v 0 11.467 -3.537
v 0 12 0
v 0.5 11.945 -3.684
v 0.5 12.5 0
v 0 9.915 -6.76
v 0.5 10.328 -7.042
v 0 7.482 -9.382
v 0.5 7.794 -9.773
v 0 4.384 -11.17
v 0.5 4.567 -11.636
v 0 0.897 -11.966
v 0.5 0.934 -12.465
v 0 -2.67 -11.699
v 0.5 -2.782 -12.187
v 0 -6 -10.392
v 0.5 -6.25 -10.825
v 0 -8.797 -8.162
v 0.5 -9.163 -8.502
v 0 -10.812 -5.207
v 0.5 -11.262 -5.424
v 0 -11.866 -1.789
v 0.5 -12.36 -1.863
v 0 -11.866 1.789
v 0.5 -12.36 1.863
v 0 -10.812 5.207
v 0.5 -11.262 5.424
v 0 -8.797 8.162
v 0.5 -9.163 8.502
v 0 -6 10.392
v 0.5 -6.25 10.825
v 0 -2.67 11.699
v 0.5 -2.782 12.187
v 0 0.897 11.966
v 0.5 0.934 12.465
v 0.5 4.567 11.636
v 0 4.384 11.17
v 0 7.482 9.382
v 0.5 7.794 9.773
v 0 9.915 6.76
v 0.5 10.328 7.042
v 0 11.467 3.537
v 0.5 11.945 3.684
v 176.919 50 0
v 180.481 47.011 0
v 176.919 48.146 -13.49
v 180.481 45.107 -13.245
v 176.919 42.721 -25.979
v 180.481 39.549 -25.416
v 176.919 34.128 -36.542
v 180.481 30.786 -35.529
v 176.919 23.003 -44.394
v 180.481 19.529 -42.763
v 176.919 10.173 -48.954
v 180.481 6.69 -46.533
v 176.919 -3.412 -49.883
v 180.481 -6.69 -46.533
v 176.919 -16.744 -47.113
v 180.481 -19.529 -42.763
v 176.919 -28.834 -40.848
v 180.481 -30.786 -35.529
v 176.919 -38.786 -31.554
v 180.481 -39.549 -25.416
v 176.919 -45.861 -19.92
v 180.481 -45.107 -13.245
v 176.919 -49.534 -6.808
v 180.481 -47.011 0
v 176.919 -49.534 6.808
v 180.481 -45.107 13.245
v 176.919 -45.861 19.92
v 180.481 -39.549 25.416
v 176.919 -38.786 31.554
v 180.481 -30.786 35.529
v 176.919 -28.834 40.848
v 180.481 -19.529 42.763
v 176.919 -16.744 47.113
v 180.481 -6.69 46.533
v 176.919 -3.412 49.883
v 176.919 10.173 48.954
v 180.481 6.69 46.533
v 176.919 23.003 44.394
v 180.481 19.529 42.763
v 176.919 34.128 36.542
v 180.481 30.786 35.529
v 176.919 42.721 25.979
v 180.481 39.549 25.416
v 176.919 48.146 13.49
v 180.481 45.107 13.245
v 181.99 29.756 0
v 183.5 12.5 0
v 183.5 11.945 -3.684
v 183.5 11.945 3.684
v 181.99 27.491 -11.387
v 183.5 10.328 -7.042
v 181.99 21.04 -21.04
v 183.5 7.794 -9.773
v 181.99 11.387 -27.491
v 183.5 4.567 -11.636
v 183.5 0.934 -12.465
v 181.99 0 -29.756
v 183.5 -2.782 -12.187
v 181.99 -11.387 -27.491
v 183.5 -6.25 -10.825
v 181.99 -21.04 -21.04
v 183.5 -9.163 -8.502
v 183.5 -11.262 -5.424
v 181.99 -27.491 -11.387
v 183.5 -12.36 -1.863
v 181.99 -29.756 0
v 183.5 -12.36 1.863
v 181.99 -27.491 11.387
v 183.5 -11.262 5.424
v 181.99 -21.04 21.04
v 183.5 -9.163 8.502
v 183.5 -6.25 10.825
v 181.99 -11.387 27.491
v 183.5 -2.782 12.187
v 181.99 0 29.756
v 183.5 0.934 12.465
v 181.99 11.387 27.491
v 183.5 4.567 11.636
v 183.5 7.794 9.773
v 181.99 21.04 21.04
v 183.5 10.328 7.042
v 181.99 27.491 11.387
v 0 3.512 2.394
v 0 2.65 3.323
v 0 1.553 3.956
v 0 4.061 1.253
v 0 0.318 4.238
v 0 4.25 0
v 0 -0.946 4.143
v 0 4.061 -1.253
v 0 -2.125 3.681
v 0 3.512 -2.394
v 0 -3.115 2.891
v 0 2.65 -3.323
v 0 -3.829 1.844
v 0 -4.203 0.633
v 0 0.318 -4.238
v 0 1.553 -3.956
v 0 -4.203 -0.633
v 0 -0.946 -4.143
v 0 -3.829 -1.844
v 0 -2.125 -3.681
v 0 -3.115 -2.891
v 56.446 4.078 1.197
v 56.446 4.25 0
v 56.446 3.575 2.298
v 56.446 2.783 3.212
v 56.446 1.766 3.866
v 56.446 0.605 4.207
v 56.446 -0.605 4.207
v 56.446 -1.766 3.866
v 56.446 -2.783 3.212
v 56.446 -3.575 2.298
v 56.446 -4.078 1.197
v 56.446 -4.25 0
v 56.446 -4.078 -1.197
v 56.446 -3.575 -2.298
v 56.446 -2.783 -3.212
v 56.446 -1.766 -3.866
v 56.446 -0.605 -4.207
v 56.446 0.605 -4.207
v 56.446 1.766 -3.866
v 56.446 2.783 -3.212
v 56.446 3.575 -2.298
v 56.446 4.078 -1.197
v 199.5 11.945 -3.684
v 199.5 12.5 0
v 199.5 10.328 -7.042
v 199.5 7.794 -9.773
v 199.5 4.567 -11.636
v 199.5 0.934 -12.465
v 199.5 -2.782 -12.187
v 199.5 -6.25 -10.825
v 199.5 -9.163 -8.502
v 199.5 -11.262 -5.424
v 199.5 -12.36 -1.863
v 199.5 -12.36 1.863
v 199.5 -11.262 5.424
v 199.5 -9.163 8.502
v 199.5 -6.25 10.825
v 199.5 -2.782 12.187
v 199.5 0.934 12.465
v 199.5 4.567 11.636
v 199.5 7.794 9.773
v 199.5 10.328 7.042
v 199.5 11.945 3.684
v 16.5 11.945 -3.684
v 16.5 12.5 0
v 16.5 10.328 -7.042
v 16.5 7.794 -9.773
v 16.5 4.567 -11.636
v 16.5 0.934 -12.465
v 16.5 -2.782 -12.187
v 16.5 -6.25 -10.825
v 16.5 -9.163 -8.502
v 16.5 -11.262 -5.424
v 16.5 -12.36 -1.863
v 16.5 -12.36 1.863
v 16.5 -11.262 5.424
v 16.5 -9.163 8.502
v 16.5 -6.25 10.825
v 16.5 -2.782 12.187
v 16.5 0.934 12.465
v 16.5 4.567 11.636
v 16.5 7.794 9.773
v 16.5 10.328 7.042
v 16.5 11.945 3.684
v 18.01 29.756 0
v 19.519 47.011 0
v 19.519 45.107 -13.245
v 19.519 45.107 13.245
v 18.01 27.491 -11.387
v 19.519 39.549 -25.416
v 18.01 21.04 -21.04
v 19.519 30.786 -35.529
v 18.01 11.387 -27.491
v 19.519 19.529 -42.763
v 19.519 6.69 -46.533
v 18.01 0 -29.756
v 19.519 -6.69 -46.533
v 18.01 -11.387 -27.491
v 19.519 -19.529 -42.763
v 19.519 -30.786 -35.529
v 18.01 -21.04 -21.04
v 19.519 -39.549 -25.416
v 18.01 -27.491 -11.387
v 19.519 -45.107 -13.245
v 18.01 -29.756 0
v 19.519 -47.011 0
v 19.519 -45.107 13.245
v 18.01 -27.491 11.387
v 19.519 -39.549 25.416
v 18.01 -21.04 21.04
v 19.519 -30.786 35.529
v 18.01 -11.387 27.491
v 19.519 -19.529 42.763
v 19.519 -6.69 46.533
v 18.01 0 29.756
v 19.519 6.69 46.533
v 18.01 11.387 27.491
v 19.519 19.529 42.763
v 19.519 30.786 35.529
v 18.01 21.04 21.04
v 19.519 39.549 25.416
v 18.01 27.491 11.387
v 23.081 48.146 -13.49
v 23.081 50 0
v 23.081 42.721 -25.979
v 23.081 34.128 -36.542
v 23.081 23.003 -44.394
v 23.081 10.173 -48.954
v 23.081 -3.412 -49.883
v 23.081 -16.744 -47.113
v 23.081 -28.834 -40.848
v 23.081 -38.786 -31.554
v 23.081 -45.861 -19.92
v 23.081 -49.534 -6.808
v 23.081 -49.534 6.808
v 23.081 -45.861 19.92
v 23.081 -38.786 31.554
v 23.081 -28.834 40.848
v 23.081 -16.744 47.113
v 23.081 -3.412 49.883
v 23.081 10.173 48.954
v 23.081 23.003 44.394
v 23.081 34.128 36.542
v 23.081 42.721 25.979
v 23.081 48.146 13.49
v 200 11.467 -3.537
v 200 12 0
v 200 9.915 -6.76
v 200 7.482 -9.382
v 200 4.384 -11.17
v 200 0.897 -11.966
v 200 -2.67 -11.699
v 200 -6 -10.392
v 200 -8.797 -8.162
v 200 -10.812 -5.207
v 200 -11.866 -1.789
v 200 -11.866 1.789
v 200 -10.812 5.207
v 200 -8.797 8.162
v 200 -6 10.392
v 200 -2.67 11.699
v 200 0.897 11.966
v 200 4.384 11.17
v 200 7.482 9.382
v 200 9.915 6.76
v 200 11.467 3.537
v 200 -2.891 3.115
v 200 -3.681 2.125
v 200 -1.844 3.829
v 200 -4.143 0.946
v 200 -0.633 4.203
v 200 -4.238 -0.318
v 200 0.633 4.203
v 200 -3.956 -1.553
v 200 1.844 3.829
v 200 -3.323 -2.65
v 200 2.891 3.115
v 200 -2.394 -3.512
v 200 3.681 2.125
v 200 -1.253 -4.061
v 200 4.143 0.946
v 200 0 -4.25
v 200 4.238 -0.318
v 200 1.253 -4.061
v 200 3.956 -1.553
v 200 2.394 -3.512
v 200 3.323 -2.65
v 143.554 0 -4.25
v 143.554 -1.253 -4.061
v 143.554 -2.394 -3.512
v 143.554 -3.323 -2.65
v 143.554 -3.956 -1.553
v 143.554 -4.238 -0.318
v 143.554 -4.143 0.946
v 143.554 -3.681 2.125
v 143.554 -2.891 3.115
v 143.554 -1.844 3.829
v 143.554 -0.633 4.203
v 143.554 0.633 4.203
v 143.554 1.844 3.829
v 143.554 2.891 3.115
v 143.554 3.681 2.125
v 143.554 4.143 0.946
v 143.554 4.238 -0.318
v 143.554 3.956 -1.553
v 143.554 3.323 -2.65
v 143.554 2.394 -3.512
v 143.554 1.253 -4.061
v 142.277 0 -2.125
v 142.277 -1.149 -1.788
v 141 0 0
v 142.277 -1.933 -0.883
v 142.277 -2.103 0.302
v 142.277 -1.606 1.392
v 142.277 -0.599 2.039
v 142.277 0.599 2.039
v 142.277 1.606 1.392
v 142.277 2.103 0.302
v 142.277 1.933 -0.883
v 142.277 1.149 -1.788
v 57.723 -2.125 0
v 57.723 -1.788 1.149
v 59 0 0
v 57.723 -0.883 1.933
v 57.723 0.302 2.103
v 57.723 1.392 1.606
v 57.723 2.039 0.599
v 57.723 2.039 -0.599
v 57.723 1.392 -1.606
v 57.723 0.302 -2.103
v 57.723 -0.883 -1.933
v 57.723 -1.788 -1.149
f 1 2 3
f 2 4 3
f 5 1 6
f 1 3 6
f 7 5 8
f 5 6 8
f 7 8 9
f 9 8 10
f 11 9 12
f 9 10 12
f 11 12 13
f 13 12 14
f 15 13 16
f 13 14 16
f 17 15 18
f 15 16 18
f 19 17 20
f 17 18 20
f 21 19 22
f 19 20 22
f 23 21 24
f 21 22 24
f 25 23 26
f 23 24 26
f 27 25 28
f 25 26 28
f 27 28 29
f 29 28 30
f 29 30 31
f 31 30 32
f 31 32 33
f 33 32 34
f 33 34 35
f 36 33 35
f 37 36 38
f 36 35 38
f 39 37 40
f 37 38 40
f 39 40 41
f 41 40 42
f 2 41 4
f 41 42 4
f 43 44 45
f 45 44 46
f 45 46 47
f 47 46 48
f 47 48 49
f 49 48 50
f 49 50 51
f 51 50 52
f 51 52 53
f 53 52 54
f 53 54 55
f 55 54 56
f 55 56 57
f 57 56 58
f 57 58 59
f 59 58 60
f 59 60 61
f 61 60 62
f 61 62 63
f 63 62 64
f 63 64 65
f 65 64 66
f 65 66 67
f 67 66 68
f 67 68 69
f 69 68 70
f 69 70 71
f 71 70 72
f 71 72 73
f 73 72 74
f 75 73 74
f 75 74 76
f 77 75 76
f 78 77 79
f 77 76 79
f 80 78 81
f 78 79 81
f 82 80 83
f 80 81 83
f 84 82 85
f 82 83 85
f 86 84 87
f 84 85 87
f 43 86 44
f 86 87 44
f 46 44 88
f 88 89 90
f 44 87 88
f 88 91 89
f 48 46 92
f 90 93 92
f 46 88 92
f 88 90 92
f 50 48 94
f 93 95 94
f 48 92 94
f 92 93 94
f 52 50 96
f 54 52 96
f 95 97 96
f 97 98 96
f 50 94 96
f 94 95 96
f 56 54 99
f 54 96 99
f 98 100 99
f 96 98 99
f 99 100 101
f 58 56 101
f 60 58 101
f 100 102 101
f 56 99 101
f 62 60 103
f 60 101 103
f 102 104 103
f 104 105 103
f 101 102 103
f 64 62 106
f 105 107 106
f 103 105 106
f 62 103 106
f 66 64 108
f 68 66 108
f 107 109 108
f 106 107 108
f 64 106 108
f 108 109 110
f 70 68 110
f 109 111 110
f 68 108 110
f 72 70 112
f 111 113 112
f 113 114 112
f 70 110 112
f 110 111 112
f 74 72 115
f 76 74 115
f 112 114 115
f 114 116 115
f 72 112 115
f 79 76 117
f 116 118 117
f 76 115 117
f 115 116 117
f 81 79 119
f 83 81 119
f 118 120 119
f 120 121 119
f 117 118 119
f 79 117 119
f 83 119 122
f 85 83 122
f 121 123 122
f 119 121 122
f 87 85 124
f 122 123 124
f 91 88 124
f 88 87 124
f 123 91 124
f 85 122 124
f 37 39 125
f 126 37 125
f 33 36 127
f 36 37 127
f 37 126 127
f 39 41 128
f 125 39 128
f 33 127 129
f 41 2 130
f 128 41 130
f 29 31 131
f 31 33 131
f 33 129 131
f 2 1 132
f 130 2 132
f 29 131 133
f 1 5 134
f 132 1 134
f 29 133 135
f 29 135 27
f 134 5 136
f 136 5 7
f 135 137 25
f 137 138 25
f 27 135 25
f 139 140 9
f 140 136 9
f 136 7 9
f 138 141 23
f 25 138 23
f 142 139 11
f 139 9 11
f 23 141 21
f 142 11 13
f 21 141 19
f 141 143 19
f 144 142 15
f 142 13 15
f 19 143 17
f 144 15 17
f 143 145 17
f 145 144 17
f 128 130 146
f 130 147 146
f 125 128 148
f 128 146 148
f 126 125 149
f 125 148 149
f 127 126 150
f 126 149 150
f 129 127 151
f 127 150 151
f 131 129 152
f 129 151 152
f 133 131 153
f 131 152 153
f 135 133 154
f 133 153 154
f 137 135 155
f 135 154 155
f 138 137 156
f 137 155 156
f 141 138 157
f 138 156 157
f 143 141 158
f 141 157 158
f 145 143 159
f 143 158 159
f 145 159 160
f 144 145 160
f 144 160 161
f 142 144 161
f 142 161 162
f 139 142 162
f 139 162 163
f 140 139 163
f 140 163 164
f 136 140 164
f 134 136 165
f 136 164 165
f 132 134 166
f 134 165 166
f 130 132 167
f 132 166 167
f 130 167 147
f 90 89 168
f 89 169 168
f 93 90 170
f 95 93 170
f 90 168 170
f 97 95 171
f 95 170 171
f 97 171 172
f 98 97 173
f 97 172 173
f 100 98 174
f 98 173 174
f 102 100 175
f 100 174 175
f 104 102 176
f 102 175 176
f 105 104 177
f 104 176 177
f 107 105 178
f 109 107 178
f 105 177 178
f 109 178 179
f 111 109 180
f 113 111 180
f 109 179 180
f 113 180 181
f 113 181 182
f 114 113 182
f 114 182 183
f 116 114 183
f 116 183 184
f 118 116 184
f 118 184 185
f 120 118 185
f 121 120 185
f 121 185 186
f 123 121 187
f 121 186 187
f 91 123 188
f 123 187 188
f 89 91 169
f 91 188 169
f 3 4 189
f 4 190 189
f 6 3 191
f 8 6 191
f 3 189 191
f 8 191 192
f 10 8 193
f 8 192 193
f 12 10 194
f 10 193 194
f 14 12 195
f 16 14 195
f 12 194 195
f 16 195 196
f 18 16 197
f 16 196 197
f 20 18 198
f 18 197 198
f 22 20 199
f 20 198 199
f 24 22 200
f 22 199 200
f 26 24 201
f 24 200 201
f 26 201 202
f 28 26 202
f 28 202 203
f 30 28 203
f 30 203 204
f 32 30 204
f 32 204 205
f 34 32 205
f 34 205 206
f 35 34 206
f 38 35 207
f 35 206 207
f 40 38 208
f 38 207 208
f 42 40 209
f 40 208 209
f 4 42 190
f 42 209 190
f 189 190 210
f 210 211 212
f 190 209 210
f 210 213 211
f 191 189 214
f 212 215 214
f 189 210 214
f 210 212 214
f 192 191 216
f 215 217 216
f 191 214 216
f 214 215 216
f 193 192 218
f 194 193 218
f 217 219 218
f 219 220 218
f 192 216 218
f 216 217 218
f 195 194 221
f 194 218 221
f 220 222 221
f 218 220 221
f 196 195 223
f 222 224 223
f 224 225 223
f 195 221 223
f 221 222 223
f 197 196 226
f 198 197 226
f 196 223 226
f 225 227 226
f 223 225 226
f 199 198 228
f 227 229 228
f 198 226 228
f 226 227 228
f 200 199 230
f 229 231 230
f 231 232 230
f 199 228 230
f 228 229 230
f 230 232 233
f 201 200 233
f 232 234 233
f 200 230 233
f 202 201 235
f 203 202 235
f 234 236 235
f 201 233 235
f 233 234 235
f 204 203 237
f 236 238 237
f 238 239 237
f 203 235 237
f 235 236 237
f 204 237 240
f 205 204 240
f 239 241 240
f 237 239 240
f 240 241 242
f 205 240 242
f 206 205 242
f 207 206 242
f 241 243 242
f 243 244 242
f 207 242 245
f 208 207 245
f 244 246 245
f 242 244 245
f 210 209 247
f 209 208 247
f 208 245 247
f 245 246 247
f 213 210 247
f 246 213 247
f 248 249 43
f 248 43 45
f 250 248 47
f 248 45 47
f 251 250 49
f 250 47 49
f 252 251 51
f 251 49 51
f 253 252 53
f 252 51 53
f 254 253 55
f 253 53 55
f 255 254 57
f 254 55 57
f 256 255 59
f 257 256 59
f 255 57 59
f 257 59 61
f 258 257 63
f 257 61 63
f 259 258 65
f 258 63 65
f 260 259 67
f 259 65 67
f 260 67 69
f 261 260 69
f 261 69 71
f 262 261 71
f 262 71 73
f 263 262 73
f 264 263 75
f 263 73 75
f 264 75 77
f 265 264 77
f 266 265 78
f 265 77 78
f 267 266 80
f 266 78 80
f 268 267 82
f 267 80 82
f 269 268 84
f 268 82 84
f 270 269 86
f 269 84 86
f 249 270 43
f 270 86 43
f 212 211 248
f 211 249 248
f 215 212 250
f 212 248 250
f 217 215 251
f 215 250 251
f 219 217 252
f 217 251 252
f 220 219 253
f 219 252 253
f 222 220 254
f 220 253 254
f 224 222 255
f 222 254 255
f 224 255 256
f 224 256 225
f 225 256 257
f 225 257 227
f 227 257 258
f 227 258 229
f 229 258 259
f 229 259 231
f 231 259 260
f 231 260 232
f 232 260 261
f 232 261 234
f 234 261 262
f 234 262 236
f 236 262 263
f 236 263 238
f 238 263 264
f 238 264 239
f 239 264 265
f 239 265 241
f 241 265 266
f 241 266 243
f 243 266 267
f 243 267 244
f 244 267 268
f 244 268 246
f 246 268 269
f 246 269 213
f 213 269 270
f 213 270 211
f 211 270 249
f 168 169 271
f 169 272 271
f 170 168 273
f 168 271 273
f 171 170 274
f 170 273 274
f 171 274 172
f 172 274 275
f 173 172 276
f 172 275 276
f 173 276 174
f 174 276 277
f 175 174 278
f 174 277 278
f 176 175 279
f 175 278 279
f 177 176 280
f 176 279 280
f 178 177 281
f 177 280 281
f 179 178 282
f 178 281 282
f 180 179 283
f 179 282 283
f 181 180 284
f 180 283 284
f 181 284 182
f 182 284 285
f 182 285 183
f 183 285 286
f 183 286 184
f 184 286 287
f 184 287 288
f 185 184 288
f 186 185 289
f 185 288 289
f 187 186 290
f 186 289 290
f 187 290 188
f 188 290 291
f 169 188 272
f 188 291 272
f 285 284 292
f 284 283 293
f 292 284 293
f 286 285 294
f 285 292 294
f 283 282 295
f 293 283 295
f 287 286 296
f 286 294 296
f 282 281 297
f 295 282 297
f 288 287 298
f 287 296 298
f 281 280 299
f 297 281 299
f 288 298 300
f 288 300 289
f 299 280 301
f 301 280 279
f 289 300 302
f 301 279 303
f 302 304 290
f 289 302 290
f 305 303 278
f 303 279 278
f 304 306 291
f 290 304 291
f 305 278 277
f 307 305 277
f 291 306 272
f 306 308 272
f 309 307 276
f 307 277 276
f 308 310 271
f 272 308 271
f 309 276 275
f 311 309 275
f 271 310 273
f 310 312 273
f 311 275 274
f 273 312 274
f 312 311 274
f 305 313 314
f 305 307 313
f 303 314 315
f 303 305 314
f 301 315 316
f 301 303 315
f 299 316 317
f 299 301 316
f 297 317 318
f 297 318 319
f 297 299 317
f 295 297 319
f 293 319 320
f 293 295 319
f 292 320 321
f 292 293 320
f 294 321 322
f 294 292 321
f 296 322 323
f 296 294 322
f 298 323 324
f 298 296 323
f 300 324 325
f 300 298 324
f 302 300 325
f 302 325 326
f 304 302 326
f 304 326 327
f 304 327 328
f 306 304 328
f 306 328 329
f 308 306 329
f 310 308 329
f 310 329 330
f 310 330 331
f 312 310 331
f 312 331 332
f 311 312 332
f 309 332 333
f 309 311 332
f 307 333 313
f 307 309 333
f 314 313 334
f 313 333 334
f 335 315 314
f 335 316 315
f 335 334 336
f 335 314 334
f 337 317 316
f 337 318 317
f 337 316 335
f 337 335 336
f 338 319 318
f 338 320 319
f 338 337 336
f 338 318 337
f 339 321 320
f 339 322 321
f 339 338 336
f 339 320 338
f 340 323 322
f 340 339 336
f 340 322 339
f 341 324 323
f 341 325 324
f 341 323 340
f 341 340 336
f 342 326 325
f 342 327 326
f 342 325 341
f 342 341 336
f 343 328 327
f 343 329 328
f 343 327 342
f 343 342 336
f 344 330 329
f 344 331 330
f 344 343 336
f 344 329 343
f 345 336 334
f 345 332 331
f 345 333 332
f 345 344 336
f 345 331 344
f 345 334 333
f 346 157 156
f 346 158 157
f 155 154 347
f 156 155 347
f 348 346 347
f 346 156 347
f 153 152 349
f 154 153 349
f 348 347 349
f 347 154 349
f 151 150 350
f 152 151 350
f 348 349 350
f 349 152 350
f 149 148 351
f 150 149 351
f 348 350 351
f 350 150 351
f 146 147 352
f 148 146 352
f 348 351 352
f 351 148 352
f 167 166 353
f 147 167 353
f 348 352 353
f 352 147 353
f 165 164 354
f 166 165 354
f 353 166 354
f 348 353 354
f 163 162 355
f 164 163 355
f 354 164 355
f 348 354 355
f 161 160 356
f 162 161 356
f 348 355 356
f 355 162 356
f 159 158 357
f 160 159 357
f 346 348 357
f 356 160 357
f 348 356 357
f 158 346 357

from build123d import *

# Parameters (mm, degrees)
TALADRO_ROSCADO_M102_D     = 8.5
TALADRO_ROSCADO_M102_DEPTH = 56.446342369
TALADRO_ROSCADO_M102_TIP   = 2.553657631


with BuildPart() as part:
    # Croquis1 → Revolución1 (revolve)
    with BuildSketch(Plane.XY):
        Polygon((0, 0), (0, 12), (0.5, 12.5), (16.5, 12.5), (19.519357654, 47.011415906), (23.081013485, 50), (176.918986515, 50), (180.480642346, 47.011415906), (183.5, 12.5), (199.5, 12.5), (200, 12), (200, 0), align=None)
    revolve(axis=Axis((200, 0, 0), (-1, 0, 0)))

    # Croquis4 → Taladro roscado M101 (revolve, cut)
    with BuildSketch(Plane(origin=(200, 0, 0), x_dir=(0, 0, -1), z_dir=(0, 1, 0))):
        Polygon((0, 0), (0, 59), (4.25, 56.446342369), (4.25, 0), align=None)
    revolve(axis=Axis((206.35, 0, 0), (-1, 0, 0)), mode=Mode.SUBTRACT)

    # Taladro roscado M102
    with Locations(Plane(origin=(0, 0, 0), x_dir=(0, -1, 0), z_dir=(-1, 0, 0))):
        with Locations((0, 0)):
            Hole(TALADRO_ROSCADO_M102_D / 2, depth=TALADRO_ROSCADO_M102_DEPTH)
            with Locations((0, 0, -(TALADRO_ROSCADO_M102_DEPTH + TALADRO_ROSCADO_M102_TIP / 2))):  # 118° drill point
                Cone(0, TALADRO_ROSCADO_M102_D / 2, TALADRO_ROSCADO_M102_TIP, mode=Mode.SUBTRACT)


solid = part.part
